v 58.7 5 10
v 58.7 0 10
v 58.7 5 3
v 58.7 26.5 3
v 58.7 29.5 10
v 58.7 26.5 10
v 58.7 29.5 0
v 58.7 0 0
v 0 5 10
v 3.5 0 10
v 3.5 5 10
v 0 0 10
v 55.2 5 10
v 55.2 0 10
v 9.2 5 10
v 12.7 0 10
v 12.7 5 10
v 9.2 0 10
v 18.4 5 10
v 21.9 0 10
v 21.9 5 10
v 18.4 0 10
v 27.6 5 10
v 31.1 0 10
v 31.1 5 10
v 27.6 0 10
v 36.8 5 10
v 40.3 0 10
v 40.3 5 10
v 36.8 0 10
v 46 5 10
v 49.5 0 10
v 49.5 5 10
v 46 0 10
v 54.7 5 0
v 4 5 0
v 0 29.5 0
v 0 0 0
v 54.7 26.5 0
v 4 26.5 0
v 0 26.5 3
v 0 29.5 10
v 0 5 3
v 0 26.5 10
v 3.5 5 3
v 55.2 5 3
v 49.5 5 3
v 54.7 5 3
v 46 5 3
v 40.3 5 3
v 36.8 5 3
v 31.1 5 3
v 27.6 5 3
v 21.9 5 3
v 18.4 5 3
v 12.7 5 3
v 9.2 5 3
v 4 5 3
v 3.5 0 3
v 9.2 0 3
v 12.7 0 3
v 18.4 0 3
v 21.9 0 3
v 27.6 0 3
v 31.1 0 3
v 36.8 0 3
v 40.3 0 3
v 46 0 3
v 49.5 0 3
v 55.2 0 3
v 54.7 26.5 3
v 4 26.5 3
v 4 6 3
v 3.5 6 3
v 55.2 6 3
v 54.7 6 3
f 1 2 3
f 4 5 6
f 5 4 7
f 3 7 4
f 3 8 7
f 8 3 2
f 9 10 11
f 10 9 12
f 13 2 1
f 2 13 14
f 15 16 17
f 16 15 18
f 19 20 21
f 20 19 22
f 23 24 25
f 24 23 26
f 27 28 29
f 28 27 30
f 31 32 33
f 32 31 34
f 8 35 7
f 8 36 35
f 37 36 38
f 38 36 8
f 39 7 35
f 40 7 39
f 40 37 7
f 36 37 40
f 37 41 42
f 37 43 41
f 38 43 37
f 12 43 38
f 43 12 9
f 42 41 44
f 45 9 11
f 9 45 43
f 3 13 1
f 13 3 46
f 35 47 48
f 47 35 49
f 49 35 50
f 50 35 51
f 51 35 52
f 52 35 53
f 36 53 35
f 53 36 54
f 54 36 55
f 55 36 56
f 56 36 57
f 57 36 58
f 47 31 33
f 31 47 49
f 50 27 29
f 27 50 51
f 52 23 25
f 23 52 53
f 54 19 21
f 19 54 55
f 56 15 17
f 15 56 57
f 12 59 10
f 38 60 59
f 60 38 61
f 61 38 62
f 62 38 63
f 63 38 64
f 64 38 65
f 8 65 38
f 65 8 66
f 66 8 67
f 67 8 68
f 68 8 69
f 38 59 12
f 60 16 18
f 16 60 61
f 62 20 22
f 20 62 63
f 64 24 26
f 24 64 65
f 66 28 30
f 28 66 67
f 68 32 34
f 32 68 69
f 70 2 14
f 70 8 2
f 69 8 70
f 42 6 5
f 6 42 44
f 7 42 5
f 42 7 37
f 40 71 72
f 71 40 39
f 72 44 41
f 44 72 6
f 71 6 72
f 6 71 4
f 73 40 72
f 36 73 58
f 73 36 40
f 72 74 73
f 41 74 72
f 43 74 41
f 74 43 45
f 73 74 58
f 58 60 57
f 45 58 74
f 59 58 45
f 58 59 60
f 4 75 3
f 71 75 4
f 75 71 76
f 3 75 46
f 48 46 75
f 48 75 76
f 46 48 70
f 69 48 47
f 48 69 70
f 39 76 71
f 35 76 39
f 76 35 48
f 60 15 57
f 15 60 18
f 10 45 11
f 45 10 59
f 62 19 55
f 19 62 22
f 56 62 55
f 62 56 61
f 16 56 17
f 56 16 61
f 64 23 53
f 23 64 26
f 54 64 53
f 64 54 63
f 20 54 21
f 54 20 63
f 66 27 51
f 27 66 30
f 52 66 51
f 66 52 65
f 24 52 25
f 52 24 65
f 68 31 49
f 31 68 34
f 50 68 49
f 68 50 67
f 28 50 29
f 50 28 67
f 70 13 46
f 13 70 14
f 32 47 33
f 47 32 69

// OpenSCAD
//Gluing Jig for Folger Tech Carbon Fiber Arms
//10/1/2016     By: David Bunch
//
//This is customizable

//1. Width of Rod Ends across Flat side of Hex
RodEnd_Wid = 5.7;       //[4:0.1:10]

//2. Width of Front support
Fr_Wid = 3.5;           //[2:0.5:5]

//3. Width of Front Rod End Support
Fr_Len = 5.0;           //[2:0.5:10]

//4. Length to hold Rod Ends
Len = 21.5;             //[10:0.1:30]

//5. Height of Front & Back Support
Ht = 7;                 //[4:0.5:20]

//6. Height of Base
Base_Ht = 3.0;          //[2:0.1:6]

//7. Width of Back
Back_Wid = 3.0;         //[2:0.5:10]

//8. How Many rods are we Gluing
Rod_Qty = 6;            //[1:1:6]

//9. Rod End Hole size for Rod Ends Visual Display
Hole_OD = 3.7;          //[3:0.1:5]

//10. Rod End Diameter
End_OD = 10.5;          //[6:0.5:20]

/* [Hidden] */

Spacing = Fr_Wid + RodEnd_Wid;

End_Rad = End_OD / 2;
R_Wid2 = RodEnd_Wid / 2;
Rod_Rad = R_Wid2 / cos(30);
Rod_OD = Rod_Rad * 2;
//Wid = (Rod_Qty * RodEnd_Wid) + ((Rod_Qty + 1) * Fr_Wid);
Wid = Fr_Wid + (Rod_Qty * Spacing);
Tot_Ht = Base_Ht + Ht;

echo(Spacing = Spacing);
echo(R_Wid2 = R_Wid2);
echo(Rod_Rad = Rod_Rad);
echo(Rod_OD = Rod_OD);
echo(Wid = Wid);

$fn=16;             //Not much resolutions needed since it is just for display

module RodEnd()
{
    translate([Fr_Wid+R_Wid2,-End_Rad+Fr_Len+Len,Base_Ht+Rod_Rad])
    rotate([0,0,-90])
    rotate([90,0,0])
    {
        difference()
            {
            union()
            {
                translate([7+5.25,0,0])
                rotate([0,90,0])
                rotate([0,0,30])
                cylinder(d=Rod_OD,h=12.5,$fn=6);
                hull()
                {
                    translate([7+5.25,0,0])
                    rotate([0,90,0])
                    rotate([0,0,30])
                    cylinder(d=Rod_OD,h=.1,$fn=6);
                    translate([7,-Rod_Rad,-1.5])
                    cube([.1,Rod_OD,3]);
                }
                hull()
                {
                    translate([0,0,-1.5])
                    cylinder(d=End_OD,h=3);
                    translate([7,-Rod_Rad,-1.5])
                    cube([.1,Rod_OD,3]);
                }
            }
            cylinder(d=Hole_OD,h=10,center=true);
        }
        translate([7+5.25+12.5,0,0])
        rotate([0,90,0])
        cylinder(d=5,h=40);
    }
}
module Rods()
{
    for (a =[0:Rod_Qty-1])
    {
        translate([(a*Spacing),0,0])
        RodEnd();
    }
}
module DrawFinal()
{
    difference()
    {
        union()
        {
            cube([Wid,Fr_Len,Tot_Ht]);      //Front Cube
            //cube([58.55,15,3]);
            translate([0,Fr_Len + Len,0])
            cube([Wid,Back_Wid,Tot_Ht]);    //Back Cube
            cube([4,Fr_Len + Len,Base_Ht]);
            translate([Wid-4,0,0])
            cube([4,Fr_Len + Len,Base_Ht]);
        }
        for (a =[0:5])
        {
            translate([Fr_Wid+(a*Spacing),-1,Base_Ht])
            cube([RodEnd_Wid,Fr_Len + 2,Tot_Ht]);   //Cut out for Rod Arms to pass thru
        }
    }
}
DrawFinal();
%Rods();
